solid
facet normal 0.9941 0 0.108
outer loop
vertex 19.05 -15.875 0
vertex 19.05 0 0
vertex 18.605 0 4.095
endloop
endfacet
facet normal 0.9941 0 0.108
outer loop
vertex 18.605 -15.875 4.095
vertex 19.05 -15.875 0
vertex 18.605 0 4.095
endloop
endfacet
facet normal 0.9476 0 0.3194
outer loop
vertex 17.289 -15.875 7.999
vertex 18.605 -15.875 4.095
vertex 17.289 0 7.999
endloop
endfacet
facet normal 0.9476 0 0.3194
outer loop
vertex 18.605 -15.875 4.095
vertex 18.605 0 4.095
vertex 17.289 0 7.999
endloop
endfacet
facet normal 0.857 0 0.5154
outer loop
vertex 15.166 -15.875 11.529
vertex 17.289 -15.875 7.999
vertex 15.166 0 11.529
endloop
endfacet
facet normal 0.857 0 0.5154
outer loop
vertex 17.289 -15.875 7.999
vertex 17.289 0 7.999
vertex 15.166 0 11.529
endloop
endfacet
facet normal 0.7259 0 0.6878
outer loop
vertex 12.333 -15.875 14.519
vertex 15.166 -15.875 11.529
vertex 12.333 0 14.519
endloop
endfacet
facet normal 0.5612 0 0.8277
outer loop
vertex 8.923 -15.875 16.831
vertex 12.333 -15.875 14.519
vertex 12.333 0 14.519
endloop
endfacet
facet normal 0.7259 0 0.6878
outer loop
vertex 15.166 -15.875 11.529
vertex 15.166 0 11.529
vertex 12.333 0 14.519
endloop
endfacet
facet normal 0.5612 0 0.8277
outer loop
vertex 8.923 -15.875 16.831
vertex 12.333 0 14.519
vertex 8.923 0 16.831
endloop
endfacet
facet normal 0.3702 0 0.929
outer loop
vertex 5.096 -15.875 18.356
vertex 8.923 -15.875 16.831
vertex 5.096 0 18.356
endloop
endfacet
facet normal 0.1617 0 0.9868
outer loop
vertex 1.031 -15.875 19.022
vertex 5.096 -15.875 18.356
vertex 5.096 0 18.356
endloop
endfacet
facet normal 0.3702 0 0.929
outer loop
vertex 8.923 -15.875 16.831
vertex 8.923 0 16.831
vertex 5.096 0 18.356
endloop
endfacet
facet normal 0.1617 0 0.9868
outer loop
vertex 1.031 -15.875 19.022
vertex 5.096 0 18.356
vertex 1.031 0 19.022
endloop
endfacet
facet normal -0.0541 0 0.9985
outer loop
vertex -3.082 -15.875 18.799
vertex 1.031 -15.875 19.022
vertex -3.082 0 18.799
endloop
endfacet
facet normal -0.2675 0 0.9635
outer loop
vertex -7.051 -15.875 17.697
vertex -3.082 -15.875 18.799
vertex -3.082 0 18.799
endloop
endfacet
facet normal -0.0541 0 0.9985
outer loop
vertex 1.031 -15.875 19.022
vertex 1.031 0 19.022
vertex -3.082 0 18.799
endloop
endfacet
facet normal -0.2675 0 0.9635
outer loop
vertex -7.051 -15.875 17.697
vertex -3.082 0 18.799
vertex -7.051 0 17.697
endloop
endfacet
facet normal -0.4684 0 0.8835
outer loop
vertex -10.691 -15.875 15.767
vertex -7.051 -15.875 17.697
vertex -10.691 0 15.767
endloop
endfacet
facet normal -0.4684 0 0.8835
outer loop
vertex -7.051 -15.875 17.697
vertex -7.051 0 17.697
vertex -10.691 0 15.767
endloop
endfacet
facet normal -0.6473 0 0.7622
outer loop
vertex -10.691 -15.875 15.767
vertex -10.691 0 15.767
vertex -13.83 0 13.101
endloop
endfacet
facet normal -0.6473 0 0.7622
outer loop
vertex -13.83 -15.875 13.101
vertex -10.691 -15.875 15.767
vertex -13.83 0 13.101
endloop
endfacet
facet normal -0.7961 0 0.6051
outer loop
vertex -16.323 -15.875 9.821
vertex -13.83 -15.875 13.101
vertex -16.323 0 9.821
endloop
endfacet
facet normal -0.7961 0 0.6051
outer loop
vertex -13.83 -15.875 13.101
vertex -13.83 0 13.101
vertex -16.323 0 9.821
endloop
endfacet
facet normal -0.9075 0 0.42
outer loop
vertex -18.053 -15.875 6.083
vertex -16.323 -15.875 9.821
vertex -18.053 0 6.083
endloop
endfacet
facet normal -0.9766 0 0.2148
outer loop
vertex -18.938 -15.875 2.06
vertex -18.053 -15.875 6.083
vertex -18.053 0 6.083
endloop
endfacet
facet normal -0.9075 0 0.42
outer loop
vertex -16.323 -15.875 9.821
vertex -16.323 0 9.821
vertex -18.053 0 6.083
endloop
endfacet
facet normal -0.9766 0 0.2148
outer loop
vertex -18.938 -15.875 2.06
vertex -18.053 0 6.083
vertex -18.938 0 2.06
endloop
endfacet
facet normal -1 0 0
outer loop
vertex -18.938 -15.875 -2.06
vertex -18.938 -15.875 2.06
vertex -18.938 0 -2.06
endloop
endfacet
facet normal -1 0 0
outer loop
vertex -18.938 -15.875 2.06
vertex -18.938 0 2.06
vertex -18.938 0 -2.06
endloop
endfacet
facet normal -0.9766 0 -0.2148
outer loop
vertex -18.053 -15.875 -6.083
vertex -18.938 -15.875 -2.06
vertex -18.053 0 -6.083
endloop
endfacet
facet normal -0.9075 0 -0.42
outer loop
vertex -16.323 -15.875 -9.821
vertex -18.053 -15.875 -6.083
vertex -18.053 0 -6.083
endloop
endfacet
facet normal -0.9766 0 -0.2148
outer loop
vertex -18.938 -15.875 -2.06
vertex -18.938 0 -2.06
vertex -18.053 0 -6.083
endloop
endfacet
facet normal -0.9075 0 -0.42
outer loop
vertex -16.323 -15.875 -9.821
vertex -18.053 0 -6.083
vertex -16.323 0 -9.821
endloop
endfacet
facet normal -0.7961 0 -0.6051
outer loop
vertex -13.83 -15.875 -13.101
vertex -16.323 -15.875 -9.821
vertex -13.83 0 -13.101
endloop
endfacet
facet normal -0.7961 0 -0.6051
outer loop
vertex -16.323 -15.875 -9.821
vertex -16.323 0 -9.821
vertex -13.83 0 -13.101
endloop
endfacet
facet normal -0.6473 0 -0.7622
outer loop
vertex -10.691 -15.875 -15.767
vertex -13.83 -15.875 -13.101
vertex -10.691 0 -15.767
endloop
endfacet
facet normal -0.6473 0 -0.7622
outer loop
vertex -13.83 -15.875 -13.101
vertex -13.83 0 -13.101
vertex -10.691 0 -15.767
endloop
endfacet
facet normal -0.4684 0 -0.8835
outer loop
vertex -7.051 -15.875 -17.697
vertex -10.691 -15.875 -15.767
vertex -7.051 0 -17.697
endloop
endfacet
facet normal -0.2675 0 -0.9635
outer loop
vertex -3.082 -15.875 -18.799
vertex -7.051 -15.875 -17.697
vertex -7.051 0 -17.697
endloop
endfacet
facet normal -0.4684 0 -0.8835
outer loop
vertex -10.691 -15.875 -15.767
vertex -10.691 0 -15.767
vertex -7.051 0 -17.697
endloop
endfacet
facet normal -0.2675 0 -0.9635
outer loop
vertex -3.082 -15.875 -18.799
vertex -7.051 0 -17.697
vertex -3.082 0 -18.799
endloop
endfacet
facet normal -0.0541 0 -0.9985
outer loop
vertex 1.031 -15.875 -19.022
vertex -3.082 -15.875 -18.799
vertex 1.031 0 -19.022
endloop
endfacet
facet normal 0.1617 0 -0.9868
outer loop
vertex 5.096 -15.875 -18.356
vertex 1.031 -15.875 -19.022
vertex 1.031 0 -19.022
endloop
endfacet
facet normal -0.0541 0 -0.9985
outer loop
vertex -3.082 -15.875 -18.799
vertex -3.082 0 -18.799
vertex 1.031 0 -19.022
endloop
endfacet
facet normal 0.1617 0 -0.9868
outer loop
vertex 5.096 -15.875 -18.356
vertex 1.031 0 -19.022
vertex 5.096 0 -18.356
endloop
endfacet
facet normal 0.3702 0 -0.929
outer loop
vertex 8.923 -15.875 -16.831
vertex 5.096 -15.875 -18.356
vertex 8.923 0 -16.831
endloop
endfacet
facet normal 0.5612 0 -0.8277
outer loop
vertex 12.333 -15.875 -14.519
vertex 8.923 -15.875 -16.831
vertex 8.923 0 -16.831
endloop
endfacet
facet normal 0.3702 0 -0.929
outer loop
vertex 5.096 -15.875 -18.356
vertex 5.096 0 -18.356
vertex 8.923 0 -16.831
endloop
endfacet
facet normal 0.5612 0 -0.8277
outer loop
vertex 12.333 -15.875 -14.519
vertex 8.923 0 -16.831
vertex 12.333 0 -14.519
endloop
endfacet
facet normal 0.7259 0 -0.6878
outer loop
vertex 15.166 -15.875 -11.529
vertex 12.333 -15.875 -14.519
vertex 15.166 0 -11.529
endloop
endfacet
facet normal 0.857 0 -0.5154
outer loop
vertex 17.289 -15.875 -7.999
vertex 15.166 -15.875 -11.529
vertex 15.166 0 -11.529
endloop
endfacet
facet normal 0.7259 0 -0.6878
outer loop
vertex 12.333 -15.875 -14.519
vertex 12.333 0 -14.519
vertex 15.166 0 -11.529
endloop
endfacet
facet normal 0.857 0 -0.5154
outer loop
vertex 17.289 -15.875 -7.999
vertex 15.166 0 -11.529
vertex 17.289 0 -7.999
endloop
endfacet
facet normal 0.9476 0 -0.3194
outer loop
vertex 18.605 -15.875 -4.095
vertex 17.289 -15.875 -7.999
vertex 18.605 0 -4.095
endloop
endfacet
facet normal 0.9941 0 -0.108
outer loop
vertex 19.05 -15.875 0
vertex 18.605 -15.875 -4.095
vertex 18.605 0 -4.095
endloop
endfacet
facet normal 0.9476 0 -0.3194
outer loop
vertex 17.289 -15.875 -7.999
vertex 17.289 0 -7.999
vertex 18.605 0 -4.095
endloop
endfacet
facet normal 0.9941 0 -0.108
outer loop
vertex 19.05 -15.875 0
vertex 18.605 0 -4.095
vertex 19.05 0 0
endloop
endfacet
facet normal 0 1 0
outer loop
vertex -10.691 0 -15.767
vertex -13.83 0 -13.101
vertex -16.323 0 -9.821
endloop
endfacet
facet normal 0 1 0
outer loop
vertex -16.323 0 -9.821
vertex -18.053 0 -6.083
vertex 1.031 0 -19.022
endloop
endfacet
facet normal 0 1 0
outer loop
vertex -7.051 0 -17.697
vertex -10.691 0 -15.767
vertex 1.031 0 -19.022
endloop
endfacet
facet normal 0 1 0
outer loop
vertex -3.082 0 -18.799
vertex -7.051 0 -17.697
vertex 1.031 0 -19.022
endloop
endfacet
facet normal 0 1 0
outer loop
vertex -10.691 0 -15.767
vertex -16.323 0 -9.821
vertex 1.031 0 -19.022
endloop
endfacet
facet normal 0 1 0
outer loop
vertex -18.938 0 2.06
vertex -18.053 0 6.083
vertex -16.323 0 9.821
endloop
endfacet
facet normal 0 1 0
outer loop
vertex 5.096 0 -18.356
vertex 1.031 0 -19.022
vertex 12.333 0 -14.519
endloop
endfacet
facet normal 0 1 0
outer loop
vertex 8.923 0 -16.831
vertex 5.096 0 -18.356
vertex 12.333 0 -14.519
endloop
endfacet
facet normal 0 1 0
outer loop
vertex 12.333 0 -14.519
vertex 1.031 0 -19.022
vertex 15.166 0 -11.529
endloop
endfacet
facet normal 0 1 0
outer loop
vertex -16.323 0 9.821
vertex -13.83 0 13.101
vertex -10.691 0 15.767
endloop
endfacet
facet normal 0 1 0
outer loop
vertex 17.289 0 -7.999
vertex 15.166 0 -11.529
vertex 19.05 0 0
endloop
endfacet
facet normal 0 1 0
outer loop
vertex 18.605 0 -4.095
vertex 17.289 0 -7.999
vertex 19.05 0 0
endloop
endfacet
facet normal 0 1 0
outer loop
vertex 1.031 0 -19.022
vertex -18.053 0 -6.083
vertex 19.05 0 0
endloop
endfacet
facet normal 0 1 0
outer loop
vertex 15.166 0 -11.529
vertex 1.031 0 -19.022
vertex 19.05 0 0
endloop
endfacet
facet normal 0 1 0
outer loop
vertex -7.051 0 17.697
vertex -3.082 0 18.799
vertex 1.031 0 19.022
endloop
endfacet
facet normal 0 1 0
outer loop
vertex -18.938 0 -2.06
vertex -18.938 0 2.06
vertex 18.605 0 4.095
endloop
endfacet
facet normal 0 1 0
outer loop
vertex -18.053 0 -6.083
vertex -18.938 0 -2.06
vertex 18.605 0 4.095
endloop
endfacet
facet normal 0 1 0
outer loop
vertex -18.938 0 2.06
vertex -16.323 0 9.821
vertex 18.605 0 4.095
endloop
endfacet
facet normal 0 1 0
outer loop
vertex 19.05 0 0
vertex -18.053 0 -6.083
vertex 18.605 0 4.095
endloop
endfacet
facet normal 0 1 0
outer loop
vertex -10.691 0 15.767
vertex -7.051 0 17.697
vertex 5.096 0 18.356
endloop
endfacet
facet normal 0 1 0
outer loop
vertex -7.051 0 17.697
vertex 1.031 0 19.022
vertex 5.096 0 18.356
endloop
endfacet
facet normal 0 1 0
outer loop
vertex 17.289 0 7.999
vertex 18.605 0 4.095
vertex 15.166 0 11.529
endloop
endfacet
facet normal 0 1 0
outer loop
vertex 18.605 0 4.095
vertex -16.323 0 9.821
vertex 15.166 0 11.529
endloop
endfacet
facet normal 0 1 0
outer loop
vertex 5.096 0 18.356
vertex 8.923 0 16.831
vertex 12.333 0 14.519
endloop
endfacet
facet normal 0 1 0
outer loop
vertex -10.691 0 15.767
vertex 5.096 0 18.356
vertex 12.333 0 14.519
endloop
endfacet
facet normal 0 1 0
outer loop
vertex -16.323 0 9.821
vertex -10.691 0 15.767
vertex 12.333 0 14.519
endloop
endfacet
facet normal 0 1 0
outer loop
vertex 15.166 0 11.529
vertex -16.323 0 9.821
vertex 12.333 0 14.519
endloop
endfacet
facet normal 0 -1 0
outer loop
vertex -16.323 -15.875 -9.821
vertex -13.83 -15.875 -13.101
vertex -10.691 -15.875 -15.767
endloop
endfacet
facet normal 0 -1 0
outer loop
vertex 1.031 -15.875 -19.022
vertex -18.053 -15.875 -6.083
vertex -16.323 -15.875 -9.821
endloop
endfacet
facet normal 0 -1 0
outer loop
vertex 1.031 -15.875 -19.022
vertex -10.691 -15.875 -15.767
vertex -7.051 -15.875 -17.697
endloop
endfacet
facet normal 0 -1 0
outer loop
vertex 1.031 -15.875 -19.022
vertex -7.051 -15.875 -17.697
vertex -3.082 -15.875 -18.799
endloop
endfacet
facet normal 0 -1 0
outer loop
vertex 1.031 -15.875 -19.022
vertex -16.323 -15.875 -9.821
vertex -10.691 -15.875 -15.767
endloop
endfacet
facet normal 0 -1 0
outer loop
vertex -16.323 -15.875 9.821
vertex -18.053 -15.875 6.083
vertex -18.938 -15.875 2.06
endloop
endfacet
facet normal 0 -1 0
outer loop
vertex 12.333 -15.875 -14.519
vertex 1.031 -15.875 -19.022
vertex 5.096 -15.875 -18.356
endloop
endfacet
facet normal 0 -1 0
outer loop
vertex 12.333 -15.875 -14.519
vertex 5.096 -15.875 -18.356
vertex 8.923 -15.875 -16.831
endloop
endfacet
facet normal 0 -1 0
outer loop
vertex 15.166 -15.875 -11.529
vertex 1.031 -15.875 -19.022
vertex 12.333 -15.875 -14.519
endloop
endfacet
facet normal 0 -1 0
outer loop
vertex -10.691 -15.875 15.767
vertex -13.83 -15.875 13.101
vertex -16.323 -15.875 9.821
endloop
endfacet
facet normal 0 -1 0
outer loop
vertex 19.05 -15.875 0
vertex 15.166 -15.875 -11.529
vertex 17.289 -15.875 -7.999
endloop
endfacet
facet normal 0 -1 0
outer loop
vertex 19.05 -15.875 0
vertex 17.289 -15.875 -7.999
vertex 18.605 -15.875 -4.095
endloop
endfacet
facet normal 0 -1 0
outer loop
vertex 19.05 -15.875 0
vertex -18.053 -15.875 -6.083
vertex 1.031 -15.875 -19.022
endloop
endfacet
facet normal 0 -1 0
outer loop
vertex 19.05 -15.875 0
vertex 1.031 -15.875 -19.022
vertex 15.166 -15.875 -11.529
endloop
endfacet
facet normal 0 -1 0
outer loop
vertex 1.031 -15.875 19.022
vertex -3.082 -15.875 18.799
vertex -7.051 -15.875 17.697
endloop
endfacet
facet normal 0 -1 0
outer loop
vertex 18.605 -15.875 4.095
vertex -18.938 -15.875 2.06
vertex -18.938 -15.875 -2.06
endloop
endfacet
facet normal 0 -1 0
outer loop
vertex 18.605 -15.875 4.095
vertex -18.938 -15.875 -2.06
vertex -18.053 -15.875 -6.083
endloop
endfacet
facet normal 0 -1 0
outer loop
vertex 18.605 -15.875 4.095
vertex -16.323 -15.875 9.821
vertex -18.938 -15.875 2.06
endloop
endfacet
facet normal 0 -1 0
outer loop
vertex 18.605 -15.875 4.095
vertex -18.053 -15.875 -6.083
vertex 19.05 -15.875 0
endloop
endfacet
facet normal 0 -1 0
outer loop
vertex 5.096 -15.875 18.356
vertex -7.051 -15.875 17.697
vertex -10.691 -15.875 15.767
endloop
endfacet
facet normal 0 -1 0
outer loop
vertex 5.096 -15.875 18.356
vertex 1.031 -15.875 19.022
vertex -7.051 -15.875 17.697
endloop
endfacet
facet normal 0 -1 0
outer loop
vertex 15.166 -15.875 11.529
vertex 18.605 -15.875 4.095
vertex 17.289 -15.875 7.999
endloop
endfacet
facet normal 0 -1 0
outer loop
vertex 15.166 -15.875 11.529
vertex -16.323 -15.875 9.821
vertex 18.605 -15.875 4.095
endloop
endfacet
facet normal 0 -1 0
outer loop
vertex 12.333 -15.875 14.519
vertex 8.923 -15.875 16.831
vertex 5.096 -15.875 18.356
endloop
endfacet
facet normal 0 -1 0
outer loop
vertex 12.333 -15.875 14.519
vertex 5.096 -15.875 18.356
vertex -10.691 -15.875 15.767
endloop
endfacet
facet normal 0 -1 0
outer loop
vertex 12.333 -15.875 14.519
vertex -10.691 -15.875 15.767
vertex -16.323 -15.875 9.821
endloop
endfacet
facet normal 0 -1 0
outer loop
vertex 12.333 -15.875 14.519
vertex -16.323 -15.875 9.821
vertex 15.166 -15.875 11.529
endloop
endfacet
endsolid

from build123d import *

# Parameters (mm, degrees)
F0_R     = 19.05
F1_DEPTH = 15.875
F2_R     = 9.525
F3_DEPTH = 12.7
F4_DEPTH = 12.7


with BuildPart() as f1:
    # F0 (on Front) → F1 (new body)
    with BuildSketch(Plane.XZ):
        Circle(F0_R)
    extrude(amount=F1_DEPTH)

    # F2 (on Front) → F3 (cut)
    with BuildSketch(Plane.XZ):
        Circle(F2_R)
    extrude(amount=-F3_DEPTH, mode=Mode.SUBTRACT)

    # F2 (on Front) → F4 (cut)
    with BuildSketch(Plane.XZ):
        Circle(F2_R)
    extrude(amount=-F4_DEPTH, mode=Mode.SUBTRACT)


solid = f1.part
